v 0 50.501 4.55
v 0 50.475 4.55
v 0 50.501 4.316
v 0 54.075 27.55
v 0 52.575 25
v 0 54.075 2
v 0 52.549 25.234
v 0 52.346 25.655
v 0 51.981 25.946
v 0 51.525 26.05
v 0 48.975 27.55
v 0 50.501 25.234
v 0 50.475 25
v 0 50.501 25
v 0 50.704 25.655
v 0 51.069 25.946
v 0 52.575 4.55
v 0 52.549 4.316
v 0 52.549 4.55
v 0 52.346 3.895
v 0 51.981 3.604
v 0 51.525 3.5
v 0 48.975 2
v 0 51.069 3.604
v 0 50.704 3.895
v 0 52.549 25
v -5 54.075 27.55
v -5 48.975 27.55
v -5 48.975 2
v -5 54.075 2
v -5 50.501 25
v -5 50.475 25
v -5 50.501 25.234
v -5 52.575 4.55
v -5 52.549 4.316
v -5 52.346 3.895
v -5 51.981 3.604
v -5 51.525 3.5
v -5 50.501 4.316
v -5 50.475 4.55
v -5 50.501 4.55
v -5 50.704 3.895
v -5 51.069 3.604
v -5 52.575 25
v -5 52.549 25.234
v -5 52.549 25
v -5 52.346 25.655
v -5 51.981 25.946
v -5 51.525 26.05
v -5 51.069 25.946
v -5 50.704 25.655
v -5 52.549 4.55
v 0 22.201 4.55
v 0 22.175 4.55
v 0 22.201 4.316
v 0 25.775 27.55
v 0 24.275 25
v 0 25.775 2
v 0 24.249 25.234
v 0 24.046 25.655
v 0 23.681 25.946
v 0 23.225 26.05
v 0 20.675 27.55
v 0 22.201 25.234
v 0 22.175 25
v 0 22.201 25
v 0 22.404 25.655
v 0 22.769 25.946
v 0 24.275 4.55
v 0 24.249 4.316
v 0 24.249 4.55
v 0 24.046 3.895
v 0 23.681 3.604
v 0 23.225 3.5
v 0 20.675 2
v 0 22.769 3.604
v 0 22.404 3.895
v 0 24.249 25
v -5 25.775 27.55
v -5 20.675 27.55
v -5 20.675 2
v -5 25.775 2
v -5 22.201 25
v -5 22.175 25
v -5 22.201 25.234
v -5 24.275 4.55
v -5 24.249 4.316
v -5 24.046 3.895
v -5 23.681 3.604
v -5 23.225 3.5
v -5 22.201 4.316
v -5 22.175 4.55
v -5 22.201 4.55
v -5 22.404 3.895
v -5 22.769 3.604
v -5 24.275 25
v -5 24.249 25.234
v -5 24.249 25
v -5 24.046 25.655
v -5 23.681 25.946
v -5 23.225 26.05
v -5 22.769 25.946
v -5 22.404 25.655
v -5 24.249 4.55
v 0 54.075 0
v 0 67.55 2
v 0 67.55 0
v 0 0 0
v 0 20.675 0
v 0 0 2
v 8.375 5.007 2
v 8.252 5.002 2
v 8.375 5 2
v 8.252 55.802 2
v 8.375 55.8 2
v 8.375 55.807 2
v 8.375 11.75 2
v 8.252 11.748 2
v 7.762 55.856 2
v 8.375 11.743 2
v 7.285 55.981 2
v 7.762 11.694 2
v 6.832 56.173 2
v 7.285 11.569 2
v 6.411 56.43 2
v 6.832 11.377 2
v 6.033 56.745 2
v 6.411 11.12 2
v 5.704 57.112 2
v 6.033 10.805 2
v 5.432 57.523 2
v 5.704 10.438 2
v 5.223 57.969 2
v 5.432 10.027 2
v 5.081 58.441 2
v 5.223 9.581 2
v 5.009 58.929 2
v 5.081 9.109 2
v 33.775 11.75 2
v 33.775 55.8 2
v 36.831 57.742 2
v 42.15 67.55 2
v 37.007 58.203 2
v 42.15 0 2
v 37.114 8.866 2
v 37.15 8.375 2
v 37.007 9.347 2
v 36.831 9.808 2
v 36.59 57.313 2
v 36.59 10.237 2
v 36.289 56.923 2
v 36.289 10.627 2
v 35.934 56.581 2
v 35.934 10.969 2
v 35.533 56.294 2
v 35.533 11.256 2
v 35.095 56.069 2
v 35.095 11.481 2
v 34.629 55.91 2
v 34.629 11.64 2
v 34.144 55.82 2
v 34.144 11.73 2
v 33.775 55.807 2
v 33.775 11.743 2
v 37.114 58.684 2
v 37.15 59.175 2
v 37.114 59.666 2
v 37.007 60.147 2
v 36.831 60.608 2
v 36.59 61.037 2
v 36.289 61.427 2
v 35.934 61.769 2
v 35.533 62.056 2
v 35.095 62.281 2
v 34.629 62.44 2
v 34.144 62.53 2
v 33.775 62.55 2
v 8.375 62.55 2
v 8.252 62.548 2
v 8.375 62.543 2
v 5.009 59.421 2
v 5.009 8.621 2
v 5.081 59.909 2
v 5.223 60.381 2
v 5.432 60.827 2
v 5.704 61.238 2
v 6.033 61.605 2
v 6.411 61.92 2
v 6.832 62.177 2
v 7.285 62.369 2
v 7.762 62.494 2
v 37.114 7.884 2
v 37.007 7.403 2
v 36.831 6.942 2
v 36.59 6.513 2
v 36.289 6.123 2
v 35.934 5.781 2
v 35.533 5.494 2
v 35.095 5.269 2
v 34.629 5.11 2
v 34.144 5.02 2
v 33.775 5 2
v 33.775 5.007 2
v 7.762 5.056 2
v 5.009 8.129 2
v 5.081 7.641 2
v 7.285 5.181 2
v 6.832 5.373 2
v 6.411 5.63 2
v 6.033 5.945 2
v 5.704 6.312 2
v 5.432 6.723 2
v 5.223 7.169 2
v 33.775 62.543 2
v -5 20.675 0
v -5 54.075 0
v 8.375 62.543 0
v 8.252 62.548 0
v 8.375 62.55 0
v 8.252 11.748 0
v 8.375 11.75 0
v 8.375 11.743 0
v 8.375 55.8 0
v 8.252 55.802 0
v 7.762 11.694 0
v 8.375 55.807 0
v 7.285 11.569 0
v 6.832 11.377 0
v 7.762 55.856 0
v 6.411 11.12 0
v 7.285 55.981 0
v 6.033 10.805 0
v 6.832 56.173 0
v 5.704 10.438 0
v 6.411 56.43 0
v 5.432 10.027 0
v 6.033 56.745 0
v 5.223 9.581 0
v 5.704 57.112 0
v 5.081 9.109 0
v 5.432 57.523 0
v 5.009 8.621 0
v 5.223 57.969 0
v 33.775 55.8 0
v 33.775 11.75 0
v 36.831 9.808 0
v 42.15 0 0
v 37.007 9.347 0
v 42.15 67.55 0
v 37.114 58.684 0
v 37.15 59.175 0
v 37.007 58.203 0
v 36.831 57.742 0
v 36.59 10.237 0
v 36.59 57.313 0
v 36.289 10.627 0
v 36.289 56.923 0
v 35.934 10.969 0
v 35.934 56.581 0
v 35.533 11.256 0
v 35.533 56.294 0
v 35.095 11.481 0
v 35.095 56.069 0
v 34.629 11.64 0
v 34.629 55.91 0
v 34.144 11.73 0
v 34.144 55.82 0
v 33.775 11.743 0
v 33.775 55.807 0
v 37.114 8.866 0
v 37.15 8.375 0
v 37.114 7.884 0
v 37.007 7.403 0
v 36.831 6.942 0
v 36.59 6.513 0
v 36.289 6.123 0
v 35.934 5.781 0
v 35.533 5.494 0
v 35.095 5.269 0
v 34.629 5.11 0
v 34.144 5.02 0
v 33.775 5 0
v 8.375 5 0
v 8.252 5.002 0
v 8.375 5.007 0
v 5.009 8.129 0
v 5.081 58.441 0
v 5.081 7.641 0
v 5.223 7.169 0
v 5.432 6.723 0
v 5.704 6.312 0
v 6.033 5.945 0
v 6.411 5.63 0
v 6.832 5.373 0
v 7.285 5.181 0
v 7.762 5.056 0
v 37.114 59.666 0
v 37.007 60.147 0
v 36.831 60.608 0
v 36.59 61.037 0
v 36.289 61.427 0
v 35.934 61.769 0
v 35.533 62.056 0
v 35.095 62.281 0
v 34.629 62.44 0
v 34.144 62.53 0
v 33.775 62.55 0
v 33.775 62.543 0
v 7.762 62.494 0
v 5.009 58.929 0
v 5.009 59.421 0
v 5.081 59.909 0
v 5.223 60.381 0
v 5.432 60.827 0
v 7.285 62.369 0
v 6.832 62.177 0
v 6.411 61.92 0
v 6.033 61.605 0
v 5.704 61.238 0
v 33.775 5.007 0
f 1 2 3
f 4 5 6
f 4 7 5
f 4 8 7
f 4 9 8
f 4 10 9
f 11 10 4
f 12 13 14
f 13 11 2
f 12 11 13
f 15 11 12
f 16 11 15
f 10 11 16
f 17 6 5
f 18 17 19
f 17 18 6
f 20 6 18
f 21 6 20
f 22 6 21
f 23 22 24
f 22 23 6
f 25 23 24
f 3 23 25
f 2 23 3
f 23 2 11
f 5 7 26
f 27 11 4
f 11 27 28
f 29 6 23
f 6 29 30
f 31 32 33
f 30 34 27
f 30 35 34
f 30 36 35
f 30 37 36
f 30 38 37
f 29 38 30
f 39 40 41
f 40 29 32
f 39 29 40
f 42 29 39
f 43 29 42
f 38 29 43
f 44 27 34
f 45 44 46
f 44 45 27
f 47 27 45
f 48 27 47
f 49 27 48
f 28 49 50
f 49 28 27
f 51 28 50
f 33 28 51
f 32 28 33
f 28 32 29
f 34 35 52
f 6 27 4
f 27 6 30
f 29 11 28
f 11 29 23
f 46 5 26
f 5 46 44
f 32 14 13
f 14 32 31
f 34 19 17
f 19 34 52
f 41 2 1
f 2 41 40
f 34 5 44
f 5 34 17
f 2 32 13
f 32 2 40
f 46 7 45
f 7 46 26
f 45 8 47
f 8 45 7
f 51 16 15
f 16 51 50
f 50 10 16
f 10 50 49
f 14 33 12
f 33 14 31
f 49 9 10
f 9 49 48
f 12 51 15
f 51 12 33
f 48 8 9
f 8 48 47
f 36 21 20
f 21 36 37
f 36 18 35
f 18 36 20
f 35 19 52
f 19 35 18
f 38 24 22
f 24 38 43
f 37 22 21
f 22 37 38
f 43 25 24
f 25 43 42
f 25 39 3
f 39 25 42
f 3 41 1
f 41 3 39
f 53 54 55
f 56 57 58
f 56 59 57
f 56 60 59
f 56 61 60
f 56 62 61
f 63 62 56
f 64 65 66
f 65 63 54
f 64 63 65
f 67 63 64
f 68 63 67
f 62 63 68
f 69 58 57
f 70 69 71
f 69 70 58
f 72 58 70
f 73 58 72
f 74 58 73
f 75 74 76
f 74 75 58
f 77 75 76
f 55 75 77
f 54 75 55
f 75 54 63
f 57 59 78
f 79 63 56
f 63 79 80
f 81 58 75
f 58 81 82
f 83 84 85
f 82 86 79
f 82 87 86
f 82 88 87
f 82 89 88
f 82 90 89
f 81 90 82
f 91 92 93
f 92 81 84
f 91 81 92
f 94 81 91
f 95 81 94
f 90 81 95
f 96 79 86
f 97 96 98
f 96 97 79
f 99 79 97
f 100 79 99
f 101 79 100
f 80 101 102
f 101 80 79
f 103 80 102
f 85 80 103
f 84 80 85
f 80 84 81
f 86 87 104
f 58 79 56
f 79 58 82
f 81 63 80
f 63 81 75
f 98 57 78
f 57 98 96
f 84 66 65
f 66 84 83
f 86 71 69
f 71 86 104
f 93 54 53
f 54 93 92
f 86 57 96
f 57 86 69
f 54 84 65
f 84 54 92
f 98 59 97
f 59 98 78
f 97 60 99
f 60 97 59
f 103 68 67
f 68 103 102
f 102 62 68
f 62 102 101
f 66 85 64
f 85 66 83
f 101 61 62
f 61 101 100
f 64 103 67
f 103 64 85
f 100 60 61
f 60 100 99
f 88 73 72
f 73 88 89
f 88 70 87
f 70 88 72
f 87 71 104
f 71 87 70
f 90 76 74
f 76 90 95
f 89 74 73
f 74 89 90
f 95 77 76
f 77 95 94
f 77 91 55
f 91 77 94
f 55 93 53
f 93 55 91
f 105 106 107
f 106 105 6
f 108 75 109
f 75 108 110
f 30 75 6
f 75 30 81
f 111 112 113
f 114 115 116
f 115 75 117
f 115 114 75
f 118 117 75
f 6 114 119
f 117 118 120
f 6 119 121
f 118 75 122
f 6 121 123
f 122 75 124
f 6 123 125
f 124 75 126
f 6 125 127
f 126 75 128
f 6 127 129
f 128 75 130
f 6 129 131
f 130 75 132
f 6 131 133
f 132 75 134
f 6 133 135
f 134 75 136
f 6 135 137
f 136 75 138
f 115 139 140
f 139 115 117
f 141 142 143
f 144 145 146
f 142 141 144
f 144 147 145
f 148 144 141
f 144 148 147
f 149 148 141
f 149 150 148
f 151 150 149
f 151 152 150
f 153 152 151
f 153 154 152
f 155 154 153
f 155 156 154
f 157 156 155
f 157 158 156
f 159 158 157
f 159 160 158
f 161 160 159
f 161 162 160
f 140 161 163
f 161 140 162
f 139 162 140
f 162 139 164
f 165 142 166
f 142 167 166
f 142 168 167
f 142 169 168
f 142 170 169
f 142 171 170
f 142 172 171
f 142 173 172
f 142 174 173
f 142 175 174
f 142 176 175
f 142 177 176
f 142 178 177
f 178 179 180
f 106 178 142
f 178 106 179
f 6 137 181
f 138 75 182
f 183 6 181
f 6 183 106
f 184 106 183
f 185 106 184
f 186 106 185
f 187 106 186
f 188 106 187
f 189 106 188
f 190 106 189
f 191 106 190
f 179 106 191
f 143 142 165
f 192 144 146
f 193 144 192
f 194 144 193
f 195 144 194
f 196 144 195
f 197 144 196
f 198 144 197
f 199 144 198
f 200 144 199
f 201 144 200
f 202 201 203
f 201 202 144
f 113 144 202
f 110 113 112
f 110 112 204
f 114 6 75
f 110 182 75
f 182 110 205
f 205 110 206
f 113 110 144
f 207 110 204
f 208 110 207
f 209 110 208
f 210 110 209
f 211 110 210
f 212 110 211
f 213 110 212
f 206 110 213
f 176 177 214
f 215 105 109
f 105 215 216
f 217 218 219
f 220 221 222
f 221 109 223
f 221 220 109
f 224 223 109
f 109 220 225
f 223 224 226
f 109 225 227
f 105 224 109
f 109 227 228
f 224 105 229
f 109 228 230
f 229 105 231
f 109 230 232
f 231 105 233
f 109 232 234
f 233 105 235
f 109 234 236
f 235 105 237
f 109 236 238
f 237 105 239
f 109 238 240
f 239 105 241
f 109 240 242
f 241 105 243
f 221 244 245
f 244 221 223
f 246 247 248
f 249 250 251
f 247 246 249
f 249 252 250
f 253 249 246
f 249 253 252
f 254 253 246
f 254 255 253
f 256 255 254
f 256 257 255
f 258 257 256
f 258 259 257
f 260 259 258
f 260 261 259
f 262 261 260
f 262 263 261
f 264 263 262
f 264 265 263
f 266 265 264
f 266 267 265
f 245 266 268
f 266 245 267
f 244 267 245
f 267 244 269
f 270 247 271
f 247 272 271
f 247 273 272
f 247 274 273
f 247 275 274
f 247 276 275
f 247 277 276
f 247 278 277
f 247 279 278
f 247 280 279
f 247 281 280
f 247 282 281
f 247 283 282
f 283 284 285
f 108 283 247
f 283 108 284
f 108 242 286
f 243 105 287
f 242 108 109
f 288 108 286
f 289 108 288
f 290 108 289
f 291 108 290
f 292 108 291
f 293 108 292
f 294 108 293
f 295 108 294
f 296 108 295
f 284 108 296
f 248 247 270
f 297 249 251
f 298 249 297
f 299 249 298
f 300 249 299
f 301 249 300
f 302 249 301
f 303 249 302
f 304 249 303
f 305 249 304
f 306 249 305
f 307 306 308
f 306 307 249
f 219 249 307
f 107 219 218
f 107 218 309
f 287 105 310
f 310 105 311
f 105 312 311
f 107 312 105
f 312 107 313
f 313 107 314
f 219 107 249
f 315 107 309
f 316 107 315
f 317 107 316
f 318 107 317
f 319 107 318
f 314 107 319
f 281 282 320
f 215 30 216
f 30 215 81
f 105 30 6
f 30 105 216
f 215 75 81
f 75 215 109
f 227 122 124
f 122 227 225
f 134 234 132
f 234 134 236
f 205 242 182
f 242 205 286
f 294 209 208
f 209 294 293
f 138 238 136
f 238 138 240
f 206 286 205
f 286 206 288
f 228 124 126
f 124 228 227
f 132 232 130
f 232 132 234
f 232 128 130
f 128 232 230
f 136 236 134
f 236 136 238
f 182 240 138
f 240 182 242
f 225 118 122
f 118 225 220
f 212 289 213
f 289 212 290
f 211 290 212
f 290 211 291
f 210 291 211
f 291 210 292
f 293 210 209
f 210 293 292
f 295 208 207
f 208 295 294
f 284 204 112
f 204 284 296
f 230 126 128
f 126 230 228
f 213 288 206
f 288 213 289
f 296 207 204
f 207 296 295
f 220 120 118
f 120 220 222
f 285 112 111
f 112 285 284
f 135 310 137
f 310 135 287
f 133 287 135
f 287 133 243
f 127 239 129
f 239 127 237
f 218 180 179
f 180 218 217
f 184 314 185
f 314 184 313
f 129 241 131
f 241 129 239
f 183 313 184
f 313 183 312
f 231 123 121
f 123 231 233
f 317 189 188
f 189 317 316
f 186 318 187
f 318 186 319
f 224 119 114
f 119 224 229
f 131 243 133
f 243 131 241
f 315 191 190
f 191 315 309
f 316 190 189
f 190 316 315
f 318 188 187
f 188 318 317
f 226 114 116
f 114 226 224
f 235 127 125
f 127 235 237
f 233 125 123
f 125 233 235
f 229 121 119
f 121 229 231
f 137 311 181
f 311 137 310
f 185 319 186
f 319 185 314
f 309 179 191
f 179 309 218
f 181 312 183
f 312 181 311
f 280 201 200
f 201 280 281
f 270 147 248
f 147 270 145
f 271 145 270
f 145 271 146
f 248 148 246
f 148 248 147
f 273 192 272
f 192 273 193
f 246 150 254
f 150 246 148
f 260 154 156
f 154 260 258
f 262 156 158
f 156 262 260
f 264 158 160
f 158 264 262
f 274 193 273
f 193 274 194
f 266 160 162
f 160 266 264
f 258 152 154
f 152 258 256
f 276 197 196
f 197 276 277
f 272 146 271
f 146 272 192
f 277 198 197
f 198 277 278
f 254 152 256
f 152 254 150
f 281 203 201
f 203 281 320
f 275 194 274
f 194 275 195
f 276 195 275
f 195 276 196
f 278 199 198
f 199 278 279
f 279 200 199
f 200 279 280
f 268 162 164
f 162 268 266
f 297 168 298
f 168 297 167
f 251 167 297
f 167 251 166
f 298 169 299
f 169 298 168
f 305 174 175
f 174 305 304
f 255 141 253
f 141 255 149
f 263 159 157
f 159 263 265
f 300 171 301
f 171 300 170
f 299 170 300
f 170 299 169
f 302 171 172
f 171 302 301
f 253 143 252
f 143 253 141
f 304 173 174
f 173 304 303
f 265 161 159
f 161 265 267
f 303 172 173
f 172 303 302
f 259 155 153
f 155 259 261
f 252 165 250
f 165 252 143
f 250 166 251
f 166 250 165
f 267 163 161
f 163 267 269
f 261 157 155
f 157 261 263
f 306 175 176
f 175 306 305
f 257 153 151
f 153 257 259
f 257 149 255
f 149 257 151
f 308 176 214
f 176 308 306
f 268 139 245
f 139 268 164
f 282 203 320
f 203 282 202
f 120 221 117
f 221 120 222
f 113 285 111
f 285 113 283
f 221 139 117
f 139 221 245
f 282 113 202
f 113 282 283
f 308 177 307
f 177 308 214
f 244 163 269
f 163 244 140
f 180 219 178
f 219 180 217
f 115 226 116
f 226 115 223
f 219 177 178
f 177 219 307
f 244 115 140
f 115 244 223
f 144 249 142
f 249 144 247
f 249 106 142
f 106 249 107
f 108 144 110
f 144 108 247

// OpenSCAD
// [FL_INDEX: keywords="openscad, 3d_parametric, Customizable_Optics_Table_Servo_Mount, csg_solid" | COT="Parametric OpenSCAD design from 3DCodeverse"]
// Title: Customizable Optics Table Servo Mount

//design and code by emanresu (http://www.thingiverse.com/Emanresu)
//customizable servo mount for mounting hobby servos to an optics breadboard


  ////////////////
 // Parameters //
////////////////

/* [Global] */

/* [Servo Mount] */

//mounting hole type
mount_hole = "slot"; //[hole, slot]
//distance between servo mounting holes (mm)
screw_space = 28.3;
//mounting screw diameter (mm)
mount_screw_diameter = 2.1;
//how far the servo spline is from being centered between the mounting screws (mm)
shaft_offset = 3.6;
//desired height of servo spline (mm) assuming it is centered at the same height as the mounting screws
shaft_height = 25;
//thickness around mounting holes on posts (mm) set to < distance between edge of mounting holes and servo body
post_thick = 1.5;
//mounting post width
post_width = 5;

/* [Mount Base] */

//what grid are your breadboard holes spaced on? (mm)
breadboard_grid = 25.4;
//diameter of clearance hole for the type of screws your breadboard uses (mm)
breadboard_hole_diameter = 6.75;
//how many holes do you want the mounting slots to cover?
holes_x = 2;
//how many holes (inclusive) do you want the mounting slots to be spaced apart?
holes_y =3;
//how thick do you want the base? (mm)
base_thick = 2;
//how much clearance around the outside of the mounting slots do you want? (mm)
base_clearance = 5;

/* [Hidden] */

//Set openSCAD resolution
$fa=1;
$fs=0.5;

mount_screw_radius = mount_screw_diameter/2;
breadboard_hole_radius = breadboard_hole_diameter/2;


  /////////////
 // Modules //
/////////////

module mounting_holes() {
	// generates the mounting slots for bolting to the breadboard
	for (i=[0:holes_x-1:holes_x-1]) {
		for (t=[0:holes_y-1:holes_y-1]) {
			translate([i*breadboard_grid, t*breadboard_grid, 0]) {
				cylinder(r=breadboard_hole_radius, h=base_thick+1, center=false);
			}
		}	
	}
	for (j=[0:holes_y-1:holes_y-1]) {
		translate([0, j*breadboard_grid-breadboard_hole_diameter/2, 0]) {
			cube(size=[(holes_x-1)*breadboard_grid, breadboard_hole_diameter, base_thick+1], center=false);
		}
	}		
}

module mounting_plate() {
	// body...
	difference() {
		cube(size=[(holes_x-1)*breadboard_grid+2*base_clearance+breadboard_hole_diameter,
		    (holes_y-1)*breadboard_grid+2*base_clearance+breadboard_hole_diameter, base_thick], center=false);
		translate([base_clearance+breadboard_hole_radius, base_clearance+breadboard_hole_radius, -0.5]) {
			mounting_holes();
		}
	}	
}

module mount_post() {
	// body...
	if (mount_hole == "hole") {
		difference() {
			cube(size=[post_width, mount_screw_diameter+2*post_thick, shaft_height-base_thick+mount_screw_radius+post_thick], center=true);
			translate([0, 0, (shaft_height-base_thick+mount_screw_radius+post_thick)/2-(mount_screw_radius+post_thick)]) {
				rotate([0, 90, 0]) {
					cylinder(r=mount_screw_radius, h=post_width+1, center=true);
				}	
			}
		}	
	}
	if (mount_hole == "slot") {
		difference() {
			cube(size=[post_width, mount_screw_diameter+2*post_thick, shaft_height-base_thick+mount_screw_radius+post_thick], center=true);
			cube(size=[post_width+1, mount_screw_diameter, shaft_height-base_thick-mount_screw_radius-post_thick], center=true);
			translate([0, 0, (shaft_height-base_thick-mount_screw_radius-post_thick)/2]) {
				rotate([0, 90, 0]) {
					cylinder(r=mount_screw_radius, h=post_width+1, center=true);
				}	
			}
			translate([0, 0, -(shaft_height-base_thick-mount_screw_radius-post_thick)/2]) {
				rotate([0, 90, 0]) {
					cylinder(r=mount_screw_radius, h=post_width+1, center=true);
				}	
			}
		}
	}
}

module servo_mount() {
	// body...
	union() {
		translate([0, screw_space/2, (shaft_height-base_thick+mount_screw_radius+post_thick)/2+base_thick]) {
			mount_post();
		}
		translate([0, -screw_space/2, (shaft_height-base_thick+mount_screw_radius+post_thick)/2+base_thick]) {
			mount_post();
		}
		translate([0, 0, base_thick/2]) {
			cube(size=[post_width, screw_space+mount_screw_diameter+2*post_thick, base_thick], center=true);	
		}
	}
}

module bb_servo_mount() {
	// body...
	union() {
		translate([-post_width/2, ((holes_y-1)*breadboard_grid+2*base_clearance+breadboard_hole_diameter)/2 + shaft_offset, 0]) {
			servo_mount();
		}
		mounting_plate();
	}	
}


  //////////////////
 // Control Code //
//////////////////

bb_servo_mount();
